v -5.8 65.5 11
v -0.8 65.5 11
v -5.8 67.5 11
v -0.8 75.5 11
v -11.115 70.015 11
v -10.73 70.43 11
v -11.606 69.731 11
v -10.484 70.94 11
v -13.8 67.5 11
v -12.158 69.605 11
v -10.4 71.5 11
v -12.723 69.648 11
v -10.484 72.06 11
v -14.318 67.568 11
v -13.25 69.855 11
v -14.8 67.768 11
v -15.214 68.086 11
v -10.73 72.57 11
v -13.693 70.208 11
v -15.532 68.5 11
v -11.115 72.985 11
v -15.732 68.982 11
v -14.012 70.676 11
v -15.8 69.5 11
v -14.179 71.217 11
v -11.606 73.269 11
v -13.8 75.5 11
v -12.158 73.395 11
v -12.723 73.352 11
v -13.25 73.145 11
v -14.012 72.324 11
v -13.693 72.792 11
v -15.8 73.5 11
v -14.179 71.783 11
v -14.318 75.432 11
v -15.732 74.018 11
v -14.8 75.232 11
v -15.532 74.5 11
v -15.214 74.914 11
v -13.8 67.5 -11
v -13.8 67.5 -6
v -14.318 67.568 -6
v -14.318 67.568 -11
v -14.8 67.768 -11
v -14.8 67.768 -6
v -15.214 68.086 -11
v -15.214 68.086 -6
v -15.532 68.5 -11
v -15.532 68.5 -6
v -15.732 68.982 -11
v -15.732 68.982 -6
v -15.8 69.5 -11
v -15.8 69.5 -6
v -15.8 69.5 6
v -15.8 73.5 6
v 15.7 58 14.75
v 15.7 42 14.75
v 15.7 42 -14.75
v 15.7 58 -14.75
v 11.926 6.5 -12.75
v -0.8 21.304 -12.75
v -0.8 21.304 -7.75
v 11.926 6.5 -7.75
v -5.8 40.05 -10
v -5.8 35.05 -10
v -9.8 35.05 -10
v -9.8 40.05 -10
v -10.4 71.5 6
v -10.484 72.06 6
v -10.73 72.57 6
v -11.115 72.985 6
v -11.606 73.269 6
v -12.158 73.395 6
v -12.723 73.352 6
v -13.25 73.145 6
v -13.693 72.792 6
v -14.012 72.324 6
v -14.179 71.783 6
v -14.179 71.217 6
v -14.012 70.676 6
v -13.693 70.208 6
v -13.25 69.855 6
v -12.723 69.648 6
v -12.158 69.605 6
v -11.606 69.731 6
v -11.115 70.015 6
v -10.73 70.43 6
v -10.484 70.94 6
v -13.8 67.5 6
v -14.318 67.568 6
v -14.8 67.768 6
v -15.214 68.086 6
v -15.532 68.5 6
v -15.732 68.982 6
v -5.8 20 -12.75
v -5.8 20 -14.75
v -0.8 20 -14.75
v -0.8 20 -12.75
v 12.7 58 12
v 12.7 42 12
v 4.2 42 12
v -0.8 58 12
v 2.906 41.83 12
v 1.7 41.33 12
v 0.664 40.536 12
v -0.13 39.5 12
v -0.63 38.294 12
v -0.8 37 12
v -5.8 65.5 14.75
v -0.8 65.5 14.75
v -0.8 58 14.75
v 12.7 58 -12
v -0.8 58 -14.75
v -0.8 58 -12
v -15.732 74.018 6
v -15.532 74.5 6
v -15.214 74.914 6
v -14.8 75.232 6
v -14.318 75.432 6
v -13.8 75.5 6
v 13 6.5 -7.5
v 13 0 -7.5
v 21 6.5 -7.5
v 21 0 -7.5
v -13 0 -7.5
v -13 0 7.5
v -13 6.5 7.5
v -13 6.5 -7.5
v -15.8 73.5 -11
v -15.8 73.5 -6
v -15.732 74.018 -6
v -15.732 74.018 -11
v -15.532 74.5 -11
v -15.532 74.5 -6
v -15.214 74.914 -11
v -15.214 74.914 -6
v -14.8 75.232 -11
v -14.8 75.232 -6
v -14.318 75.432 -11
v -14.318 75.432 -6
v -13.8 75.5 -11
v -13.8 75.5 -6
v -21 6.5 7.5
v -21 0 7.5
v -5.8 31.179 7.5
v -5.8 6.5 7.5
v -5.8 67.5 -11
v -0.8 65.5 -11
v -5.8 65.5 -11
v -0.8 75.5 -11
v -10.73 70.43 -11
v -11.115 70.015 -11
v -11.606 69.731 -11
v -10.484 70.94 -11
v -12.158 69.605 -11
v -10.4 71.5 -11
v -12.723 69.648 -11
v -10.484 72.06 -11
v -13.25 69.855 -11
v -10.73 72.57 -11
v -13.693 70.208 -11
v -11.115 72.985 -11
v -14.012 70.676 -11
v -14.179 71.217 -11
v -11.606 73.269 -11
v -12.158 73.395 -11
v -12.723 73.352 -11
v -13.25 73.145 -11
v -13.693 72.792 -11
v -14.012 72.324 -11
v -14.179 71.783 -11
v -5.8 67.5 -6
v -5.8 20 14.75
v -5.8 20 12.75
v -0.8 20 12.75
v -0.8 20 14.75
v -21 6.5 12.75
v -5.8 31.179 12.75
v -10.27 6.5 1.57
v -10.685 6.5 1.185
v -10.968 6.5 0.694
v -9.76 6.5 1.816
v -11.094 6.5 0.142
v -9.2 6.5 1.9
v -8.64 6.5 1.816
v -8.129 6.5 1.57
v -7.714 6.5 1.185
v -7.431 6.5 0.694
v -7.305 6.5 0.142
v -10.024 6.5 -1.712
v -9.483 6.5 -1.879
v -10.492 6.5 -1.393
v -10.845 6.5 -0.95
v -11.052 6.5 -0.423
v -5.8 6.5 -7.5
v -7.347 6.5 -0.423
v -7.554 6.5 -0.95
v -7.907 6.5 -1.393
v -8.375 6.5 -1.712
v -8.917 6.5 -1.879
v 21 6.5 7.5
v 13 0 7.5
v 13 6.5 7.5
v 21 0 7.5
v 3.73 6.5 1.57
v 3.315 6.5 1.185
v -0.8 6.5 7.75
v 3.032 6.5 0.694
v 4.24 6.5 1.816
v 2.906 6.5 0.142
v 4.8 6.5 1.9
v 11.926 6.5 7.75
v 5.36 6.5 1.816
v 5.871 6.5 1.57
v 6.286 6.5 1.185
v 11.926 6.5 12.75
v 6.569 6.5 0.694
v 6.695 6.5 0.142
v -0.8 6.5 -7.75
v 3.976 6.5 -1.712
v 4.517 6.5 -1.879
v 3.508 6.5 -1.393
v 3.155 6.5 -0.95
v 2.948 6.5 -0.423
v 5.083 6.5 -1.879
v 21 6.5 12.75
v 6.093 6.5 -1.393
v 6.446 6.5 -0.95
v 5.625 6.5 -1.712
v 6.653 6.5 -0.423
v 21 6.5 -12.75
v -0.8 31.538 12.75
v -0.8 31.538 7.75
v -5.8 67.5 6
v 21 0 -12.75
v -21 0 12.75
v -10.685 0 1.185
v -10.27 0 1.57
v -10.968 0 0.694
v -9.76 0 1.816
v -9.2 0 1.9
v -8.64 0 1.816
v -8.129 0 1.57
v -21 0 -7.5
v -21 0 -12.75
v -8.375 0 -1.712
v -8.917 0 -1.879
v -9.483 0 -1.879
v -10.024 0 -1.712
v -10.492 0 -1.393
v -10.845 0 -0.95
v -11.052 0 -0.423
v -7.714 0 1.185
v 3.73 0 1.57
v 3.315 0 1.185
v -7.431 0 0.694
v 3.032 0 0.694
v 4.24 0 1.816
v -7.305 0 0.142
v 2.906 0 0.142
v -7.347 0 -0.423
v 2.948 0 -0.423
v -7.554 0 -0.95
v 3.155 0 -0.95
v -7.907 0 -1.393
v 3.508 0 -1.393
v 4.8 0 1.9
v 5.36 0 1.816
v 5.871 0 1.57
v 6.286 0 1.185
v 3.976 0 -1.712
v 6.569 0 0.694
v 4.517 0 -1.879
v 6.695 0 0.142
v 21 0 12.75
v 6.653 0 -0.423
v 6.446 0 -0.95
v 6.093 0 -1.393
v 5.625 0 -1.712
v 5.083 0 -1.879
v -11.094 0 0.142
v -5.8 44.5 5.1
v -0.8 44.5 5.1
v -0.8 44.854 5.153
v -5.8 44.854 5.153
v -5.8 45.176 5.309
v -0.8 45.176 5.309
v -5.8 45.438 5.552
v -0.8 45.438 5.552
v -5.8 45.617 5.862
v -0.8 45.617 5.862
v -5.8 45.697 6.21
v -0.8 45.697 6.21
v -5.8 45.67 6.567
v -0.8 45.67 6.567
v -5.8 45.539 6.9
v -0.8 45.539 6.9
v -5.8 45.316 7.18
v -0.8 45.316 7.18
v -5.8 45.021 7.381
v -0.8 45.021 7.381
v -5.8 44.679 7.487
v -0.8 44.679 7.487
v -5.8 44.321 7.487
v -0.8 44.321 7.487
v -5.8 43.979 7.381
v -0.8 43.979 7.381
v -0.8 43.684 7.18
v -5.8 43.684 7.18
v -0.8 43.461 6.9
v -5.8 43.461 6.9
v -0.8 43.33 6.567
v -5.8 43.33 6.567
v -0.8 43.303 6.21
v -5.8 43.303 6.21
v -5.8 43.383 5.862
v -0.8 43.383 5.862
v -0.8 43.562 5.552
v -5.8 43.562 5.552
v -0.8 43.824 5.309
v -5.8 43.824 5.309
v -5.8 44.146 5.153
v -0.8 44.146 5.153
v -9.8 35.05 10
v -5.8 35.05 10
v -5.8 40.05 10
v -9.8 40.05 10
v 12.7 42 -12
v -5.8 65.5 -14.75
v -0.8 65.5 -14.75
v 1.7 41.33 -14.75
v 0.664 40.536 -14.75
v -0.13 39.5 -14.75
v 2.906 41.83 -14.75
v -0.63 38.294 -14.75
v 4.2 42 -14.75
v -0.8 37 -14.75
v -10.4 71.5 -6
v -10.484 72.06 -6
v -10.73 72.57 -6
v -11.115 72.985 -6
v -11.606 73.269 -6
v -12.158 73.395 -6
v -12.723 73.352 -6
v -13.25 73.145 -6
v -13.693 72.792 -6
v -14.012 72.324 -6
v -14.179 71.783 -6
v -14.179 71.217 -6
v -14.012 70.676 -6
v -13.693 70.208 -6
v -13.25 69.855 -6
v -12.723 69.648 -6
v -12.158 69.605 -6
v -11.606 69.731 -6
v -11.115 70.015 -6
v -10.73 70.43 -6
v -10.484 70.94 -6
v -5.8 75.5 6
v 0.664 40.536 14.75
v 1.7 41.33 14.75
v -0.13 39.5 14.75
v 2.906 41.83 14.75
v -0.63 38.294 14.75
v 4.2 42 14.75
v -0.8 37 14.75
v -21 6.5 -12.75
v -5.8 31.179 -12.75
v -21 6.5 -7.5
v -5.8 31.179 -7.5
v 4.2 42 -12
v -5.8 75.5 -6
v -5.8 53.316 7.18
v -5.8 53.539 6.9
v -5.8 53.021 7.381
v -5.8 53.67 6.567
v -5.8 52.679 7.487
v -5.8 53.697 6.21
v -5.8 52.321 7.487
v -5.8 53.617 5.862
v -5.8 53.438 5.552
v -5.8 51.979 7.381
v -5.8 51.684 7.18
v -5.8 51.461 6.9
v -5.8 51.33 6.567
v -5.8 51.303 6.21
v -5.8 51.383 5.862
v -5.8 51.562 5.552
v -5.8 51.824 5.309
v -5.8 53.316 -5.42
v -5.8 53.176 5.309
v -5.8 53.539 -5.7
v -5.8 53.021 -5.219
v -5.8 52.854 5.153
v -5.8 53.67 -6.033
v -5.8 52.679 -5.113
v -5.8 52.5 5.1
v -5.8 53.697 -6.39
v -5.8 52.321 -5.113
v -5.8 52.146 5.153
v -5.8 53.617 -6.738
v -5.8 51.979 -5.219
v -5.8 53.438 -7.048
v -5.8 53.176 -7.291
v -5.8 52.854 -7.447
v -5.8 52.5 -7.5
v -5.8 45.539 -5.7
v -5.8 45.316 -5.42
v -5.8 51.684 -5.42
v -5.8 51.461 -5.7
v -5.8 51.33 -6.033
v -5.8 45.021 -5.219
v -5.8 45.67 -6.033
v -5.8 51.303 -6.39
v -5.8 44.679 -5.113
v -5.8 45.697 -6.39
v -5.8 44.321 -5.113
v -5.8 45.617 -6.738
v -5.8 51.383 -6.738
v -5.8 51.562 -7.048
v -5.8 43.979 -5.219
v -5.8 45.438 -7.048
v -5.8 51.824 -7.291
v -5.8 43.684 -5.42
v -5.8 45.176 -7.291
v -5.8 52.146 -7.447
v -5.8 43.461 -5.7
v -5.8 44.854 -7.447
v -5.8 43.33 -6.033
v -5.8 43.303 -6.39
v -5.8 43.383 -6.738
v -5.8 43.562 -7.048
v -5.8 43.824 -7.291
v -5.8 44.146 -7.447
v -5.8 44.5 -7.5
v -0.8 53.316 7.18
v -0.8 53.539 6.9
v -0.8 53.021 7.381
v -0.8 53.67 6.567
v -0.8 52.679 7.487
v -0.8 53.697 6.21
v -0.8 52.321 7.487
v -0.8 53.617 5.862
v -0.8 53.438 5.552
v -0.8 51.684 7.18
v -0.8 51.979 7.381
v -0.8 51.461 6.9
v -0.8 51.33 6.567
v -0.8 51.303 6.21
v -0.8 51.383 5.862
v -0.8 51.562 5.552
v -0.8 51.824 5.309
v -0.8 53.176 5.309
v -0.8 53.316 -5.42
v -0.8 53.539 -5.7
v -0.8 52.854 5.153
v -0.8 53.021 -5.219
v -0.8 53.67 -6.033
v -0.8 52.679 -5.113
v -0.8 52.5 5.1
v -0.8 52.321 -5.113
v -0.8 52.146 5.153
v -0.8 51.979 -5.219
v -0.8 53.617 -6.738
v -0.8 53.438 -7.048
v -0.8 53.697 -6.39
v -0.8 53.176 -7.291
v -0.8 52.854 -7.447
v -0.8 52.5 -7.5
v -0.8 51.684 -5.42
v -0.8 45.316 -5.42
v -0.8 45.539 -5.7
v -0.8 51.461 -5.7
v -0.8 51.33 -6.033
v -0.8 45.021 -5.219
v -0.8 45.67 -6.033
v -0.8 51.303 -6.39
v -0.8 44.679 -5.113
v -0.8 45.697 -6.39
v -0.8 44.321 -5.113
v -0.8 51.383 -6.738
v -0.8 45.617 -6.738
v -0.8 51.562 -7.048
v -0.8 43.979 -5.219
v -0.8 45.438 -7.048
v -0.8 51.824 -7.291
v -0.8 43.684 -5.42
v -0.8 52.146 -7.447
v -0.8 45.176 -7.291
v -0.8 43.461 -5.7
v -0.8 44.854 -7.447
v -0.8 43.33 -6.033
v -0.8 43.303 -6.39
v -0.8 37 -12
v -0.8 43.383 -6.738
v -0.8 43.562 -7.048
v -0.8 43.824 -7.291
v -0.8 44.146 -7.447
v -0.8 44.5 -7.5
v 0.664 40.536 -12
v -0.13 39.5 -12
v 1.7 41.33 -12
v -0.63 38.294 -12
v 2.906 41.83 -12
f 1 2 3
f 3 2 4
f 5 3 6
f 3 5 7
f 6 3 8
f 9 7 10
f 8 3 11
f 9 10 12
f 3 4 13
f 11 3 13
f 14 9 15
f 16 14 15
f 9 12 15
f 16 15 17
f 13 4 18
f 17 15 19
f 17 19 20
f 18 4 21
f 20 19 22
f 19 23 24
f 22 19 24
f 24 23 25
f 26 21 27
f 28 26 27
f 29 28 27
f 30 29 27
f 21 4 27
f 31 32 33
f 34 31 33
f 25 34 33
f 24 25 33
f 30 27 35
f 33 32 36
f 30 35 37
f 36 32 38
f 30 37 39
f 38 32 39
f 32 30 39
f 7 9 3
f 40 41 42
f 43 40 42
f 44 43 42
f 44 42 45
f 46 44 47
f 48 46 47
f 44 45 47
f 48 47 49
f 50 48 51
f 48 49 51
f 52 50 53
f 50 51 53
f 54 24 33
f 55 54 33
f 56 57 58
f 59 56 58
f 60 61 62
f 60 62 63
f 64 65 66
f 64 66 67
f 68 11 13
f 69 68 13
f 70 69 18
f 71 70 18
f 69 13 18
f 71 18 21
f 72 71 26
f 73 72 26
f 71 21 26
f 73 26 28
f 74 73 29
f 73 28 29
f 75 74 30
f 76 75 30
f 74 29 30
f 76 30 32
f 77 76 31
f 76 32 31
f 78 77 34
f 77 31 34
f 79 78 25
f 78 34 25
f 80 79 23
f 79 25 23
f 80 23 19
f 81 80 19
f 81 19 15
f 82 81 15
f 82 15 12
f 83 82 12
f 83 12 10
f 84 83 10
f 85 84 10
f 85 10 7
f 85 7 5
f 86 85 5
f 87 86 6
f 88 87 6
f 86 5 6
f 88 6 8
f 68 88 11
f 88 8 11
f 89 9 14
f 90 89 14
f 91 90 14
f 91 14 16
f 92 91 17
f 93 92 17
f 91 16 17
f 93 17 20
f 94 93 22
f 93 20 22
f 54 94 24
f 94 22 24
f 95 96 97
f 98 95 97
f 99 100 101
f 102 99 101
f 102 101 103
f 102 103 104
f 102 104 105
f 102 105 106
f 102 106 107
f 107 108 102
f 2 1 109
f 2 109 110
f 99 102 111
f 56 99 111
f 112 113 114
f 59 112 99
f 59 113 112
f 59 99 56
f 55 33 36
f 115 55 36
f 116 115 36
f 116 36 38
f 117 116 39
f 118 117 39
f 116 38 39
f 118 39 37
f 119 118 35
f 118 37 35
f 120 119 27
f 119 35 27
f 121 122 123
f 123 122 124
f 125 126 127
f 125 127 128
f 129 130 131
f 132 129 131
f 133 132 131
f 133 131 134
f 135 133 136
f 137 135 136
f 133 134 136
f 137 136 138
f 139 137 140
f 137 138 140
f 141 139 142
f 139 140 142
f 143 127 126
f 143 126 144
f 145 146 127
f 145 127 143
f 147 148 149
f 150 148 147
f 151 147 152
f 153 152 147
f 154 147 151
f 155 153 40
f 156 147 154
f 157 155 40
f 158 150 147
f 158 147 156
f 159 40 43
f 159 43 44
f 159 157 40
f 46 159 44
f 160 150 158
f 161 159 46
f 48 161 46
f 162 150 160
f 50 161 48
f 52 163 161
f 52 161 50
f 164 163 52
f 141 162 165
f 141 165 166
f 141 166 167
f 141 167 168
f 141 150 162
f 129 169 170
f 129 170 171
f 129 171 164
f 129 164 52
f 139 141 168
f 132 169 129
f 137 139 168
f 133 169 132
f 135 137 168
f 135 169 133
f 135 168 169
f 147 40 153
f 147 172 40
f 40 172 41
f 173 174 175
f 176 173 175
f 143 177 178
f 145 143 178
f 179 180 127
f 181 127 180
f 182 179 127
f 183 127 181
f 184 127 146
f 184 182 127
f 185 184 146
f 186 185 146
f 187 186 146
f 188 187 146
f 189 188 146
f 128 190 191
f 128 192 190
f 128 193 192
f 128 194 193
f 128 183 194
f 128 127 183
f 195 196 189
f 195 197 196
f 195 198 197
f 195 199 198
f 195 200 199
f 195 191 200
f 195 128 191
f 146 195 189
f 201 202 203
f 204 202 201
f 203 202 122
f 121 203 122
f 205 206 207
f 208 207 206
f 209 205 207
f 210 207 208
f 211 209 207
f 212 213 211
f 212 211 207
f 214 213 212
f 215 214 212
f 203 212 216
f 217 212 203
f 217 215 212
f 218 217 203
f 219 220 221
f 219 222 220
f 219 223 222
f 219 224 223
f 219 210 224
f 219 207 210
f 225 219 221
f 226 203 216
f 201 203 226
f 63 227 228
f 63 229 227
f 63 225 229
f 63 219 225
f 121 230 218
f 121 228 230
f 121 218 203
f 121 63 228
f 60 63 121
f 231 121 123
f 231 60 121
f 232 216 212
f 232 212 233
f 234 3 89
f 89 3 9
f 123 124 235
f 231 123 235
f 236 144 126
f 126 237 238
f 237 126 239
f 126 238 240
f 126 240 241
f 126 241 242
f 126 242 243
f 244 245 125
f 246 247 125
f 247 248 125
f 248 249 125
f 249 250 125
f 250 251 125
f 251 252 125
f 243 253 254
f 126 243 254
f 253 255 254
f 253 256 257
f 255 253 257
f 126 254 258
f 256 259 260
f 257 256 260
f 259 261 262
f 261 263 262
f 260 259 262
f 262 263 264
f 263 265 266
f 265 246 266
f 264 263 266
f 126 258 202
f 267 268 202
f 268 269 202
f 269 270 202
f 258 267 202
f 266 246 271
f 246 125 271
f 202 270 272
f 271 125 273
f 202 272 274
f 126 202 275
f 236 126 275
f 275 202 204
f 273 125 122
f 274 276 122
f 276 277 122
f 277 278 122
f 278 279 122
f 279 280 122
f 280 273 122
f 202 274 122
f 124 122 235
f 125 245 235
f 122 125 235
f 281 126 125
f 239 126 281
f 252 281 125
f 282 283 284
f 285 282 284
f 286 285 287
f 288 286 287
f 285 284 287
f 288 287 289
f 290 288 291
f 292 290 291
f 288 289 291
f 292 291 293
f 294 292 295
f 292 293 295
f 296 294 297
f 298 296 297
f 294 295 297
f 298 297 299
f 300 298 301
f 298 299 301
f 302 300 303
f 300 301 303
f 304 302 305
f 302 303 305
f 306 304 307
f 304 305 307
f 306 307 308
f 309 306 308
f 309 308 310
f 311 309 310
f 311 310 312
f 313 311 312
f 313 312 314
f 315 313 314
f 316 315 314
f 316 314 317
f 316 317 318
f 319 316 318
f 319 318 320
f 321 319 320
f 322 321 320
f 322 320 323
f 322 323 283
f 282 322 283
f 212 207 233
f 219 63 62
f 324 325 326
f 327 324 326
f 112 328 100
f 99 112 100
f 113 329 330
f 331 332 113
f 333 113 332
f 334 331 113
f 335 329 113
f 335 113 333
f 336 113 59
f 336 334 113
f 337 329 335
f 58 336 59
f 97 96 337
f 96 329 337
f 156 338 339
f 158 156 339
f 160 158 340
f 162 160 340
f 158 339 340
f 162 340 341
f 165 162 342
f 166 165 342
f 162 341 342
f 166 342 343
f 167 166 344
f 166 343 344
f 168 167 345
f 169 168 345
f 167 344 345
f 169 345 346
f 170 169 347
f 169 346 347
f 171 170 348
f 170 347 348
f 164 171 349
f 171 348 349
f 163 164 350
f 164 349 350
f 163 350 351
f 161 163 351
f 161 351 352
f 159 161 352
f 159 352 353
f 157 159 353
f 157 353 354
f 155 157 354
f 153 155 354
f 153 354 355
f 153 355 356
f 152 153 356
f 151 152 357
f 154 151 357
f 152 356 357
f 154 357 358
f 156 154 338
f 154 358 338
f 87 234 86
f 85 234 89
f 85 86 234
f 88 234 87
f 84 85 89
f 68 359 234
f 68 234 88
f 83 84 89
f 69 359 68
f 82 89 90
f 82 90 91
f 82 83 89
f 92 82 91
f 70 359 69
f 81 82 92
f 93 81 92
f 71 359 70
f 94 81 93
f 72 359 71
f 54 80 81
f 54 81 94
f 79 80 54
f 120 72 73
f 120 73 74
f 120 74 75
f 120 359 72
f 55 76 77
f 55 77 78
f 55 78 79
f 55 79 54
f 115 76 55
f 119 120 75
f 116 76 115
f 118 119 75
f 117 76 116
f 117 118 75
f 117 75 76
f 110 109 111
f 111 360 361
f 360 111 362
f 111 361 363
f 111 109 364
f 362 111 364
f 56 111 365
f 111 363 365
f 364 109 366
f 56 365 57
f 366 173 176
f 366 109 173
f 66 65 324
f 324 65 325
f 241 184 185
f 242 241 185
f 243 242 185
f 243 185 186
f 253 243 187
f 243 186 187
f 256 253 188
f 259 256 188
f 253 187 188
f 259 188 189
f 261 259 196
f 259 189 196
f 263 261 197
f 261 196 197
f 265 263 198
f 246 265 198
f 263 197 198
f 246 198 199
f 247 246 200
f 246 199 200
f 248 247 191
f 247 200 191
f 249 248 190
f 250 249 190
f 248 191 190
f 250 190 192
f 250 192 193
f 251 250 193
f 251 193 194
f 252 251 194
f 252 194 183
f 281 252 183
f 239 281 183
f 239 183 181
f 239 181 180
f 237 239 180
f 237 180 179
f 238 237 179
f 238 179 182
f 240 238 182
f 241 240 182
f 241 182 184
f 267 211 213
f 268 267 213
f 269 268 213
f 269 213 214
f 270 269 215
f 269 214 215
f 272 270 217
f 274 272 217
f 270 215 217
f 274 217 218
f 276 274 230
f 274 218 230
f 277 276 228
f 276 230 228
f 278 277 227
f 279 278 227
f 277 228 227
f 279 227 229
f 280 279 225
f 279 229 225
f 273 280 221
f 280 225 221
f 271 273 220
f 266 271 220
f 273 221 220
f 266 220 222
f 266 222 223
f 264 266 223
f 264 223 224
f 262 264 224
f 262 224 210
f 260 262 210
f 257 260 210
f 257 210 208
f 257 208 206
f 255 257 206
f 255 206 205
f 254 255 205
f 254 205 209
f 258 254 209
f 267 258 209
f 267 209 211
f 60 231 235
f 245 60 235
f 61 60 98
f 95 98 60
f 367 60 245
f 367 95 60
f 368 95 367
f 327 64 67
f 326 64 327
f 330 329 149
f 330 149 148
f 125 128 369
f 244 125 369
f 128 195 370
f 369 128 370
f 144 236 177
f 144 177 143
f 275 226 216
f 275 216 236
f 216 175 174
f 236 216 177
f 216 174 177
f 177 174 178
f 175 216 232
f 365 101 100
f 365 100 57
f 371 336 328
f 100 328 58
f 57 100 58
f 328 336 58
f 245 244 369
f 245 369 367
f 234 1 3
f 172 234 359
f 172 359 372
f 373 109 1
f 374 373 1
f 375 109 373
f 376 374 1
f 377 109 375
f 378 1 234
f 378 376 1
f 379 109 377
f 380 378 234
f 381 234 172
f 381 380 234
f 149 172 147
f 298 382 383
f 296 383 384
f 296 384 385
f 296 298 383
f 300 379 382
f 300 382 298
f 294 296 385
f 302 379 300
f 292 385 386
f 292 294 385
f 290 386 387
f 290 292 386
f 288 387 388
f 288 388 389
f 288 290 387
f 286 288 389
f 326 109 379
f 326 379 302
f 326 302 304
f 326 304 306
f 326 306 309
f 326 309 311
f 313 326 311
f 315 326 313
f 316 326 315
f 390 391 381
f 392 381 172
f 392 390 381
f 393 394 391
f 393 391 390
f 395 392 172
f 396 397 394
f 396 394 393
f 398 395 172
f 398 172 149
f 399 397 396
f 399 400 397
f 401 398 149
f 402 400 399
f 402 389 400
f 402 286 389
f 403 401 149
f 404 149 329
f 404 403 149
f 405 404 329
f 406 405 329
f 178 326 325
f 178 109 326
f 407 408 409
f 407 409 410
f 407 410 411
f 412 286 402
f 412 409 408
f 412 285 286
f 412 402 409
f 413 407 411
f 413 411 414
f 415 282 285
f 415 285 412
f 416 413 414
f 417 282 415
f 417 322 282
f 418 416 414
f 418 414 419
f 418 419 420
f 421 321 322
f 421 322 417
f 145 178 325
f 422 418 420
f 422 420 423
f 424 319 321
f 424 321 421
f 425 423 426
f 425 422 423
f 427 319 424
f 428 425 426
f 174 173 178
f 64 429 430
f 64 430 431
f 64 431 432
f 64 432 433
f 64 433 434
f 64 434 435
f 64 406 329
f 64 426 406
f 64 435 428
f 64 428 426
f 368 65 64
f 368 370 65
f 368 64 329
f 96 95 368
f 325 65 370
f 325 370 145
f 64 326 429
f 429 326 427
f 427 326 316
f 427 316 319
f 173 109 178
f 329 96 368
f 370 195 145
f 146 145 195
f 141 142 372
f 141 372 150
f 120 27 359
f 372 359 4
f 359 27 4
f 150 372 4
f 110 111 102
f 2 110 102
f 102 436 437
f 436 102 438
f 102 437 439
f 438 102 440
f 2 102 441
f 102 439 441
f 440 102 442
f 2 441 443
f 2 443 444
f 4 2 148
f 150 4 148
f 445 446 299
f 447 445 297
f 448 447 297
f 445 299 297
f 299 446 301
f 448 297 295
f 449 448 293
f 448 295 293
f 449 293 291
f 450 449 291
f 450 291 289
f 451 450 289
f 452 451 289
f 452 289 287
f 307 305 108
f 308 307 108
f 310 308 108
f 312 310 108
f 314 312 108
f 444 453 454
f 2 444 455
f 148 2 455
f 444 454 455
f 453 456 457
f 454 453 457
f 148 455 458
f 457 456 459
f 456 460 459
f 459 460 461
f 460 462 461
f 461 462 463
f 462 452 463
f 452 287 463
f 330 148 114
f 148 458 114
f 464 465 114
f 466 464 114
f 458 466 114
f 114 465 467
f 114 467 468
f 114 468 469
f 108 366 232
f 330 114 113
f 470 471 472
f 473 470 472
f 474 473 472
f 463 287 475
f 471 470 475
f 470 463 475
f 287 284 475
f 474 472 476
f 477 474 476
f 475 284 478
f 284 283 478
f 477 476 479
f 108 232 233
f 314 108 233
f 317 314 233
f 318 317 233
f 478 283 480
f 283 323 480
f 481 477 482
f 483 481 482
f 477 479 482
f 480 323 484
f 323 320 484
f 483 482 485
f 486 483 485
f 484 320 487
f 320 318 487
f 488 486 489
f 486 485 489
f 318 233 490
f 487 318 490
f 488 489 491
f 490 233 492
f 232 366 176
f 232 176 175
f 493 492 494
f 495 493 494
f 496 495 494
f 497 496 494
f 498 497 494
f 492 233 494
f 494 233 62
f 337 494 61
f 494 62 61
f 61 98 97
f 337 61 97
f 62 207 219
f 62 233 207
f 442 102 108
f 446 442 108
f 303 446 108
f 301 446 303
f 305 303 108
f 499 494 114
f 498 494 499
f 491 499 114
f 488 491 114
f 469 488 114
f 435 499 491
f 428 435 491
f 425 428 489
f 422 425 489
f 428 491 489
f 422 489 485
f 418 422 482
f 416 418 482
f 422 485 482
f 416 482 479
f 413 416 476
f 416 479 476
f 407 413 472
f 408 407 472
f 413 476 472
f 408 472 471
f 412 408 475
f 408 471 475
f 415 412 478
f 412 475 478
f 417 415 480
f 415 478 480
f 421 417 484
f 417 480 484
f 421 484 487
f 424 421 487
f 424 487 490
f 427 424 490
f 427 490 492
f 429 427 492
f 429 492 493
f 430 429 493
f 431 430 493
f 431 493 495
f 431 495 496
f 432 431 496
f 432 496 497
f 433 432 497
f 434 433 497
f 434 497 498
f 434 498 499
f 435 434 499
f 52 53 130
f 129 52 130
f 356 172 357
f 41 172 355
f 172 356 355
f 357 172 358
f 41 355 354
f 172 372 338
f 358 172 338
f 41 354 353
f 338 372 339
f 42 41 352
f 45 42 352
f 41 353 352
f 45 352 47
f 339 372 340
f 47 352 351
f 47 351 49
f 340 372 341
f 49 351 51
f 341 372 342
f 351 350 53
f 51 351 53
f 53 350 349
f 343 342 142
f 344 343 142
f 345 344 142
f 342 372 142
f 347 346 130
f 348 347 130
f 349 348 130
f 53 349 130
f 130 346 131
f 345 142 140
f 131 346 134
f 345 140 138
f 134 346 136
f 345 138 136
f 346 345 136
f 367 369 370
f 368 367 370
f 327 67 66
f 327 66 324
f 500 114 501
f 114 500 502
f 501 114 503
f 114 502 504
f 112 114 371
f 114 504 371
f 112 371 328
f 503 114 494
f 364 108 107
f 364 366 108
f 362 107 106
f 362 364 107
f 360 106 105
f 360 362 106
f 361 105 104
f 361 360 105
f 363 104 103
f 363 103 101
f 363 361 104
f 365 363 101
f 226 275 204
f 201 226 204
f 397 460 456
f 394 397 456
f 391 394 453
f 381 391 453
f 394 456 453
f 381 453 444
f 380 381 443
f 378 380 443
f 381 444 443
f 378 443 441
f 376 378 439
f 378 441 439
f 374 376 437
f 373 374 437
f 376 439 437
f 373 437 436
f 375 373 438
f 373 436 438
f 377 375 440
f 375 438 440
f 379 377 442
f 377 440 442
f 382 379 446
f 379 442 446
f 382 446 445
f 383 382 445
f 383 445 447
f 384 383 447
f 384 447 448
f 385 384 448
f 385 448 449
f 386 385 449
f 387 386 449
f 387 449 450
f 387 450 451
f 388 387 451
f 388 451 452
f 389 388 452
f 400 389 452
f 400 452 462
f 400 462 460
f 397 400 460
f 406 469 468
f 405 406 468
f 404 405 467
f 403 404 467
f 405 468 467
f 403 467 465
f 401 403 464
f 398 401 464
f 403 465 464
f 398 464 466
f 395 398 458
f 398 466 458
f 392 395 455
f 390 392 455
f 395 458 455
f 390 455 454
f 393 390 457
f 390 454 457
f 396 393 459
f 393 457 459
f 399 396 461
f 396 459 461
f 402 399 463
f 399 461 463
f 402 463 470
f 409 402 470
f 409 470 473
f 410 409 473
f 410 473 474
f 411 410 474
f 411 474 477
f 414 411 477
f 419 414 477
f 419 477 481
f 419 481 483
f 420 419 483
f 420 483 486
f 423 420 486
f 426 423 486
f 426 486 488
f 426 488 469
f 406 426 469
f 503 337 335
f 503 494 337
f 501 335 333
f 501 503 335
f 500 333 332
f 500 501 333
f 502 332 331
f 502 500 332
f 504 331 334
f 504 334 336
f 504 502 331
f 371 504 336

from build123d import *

# Parameters (mm, degrees)
ESQUISSE1_W                = 42
ESQUISSE1_H                = 25.5
BOSS_EXTRU_1_DEPTH         = 6.5
ESQUISSE2_W                = 16
ESQUISSE2_H                = 15
ENL_V_MAT_EXTRU_1_DEPTH    = 10
ESQUISSE3_W                = 5
ESQUISSE3_H                = 25.5
BOSS_EXTRU_2_DEPTH         = 13.5
ESQUISSE6_W                = 5
ESQUISSE6_H                = 29.5
BOSS_EXTRU_3_DEPTH         = 45.5
ESQUISSE4_R                = 1.2
ENL_V_MAT_EXTRU_3_DEPTH    = 45.5
BOSS_EXTRU_4_START         = 22
BOSS_EXTRU_4_DEPTH         = 16
CONG_2_R                   = 5
BOSS_EXTRU_5_DEPTH         = 5
ESQUISSE10_R               = 1.9
ENL_V_MAT_EXTRU_5_DEPTH    = 17
ESQUISSE11_W               = 20
ESQUISSE11_H               = 5
BOSS_EXTRU_6_DEPTH         = 4
BOSS_EXTRU_7_DEPTH         = 5
BOSS_EXTRU_8_DEPTH         = 5.25
R_P_TITION_LIN_AIRE1_COUNT = 2
R_P_TITION_LIN_AIRE1_PITCH = 20.25
ESQUISSE15_W               = 5
ESQUISSE15_H               = 22
BOSS_EXTRU_9_DEPTH         = 10
ESQUISSE16_R               = 1.9
BOSS_EXTRU_10_DEPTH        = 5
R_P_TITION_LIN_AIRE2_COUNT = 2
R_P_TITION_LIN_AIRE2_PITCH = 17


with BuildPart() as part:
    # Esquisse1 → Boss.-Extru.1 (new body)
    with BuildSketch(Plane(origin=(0, 0, 0), x_dir=(1, 0, 0), z_dir=(0, 1, 0))):
        Rectangle(ESQUISSE1_W, ESQUISSE1_H)
    extrude(amount=BOSS_EXTRU_1_DEPTH)

    # Esquisse2 → Enlèv. mat.-Extru.1 (cut)
    with BuildSketch(Plane(origin=(0, 0, 0), x_dir=(1, 0, 0), z_dir=(0, 1, 0))):
        with Locations((-21, 0)):
            Rectangle(ESQUISSE2_W, ESQUISSE2_H)
        with Locations((21, 0)):
            Rectangle(ESQUISSE2_W, ESQUISSE2_H)
    extrude(amount=ENL_V_MAT_EXTRU_1_DEPTH, mode=Mode.SUBTRACT)

    # Esquisse3 → Boss.-Extru.2 (add)
    with BuildSketch(Plane(origin=(0, 6.5, 0), x_dir=(1, 0, 0), z_dir=(0, 1, 0))):
        with Locations((-3.3, 0)):
            Rectangle(ESQUISSE3_W, ESQUISSE3_H)
    extrude(amount=BOSS_EXTRU_2_DEPTH)

    # Esquisse6 → Boss.-Extru.3 (add)
    with BuildSketch(Plane(origin=(0, 20, 0), x_dir=(1, 0, 0), z_dir=(0, 1, 0))):
        with Locations((-3.3, 0)):
            Rectangle(ESQUISSE6_W, ESQUISSE6_H)
    extrude(amount=BOSS_EXTRU_3_DEPTH)

    # Esquisse4 → Enlèv. mat.-Extru.3 (cut)
    with BuildSketch(Plane(origin=(-0.8, 0, 0), x_dir=(0, 0, -1), z_dir=(1, 0, 0))):
        with Locations((-6.3, 52.5)):
            Circle(ESQUISSE4_R)
        with Locations((6.3, 52.5)):
            Circle(ESQUISSE4_R)
        with Locations((6.3, 44.5)):
            Circle(ESQUISSE4_R)
        with Locations((-6.3, 44.5)):
            Circle(ESQUISSE4_R)
    extrude(amount=-ENL_V_MAT_EXTRU_3_DEPTH, mode=Mode.SUBTRACT)

    # Esquisse5 → Boss.-Extru.4 (add)
    with BuildSketch(Plane(origin=(0, 20, 0), x_dir=(1, 0, 0), z_dir=(0, 1, 0)).offset(BOSS_EXTRU_4_START)):
        Polygon((-0.8, 14.75), (-0.8, 12), (12.7, 12), (12.7, -12), (-0.8, -12), (-0.8, -14.75), (15.7, -14.75), (15.7, 14.75), align=None)
    extrude(amount=BOSS_EXTRU_4_DEPTH)

    # Congé2
    cong_2_edges = [part.edges().sort_by_distance(p)[0] for p in [
        (-0.8, 42, 13.375),
        (-0.8, 42, -13.375),
    ]]
    fillet(cong_2_edges, radius=CONG_2_R)

    # Esquisse9 → Boss.-Extru.5 (add)
    with BuildSketch(Plane.XY.offset(12.75)):
        Polygon((-0.8, 22.034425492), (-0.8, 6.5), (11.926120582, 6.5), (-0.8, 31.53809605), align=None)
    extrude(amount=-BOSS_EXTRU_5_DEPTH)

    # Esquisse10 → Enlèv. mat.-Extru.5 (cut)
    with BuildSketch(Plane(origin=(0, 6.5, 0), x_dir=(1, 0, 0), z_dir=(0, 1, 0))):
        with Locations(Location((-9.199739461, 0, 0), (0, 0, 270))):
            Circle(ESQUISSE10_R)
        with Locations(Location((4.800260539, 0, 0), (0, 0, 270))):
            Circle(ESQUISSE10_R)
    extrude(amount=-ENL_V_MAT_EXTRU_5_DEPTH, mode=Mode.SUBTRACT)

    # Esquisse11 → Boss.-Extru.6 (add)
    with BuildSketch(Plane.ZY.offset(5.8)):
        with Locations((0, 37.55)):
            Rectangle(ESQUISSE11_W, ESQUISSE11_H)
    extrude(amount=BOSS_EXTRU_6_DEPTH)

    # Esquisse12 → Boss.-Extru.7 (add)
    with BuildSketch(Plane(origin=(0, 0, -12.75), x_dir=(-1, 0, 0), z_dir=(0, 0, -1))):
        Polygon((0.8, 21.304240475), (-11.926120582, 6.5), (0.8, 6.5), align=None)
    extrude(amount=-BOSS_EXTRU_7_DEPTH)

    # Esquisse13 → Boss.-Extru.8 (add)
    with BuildSketch(Plane.XY.offset(12.75)):
        Polygon((-21, 6.5), (-5.8, 31.179013399), (-5.8, 6.5), align=None)
    boss_extru_8 = extrude(amount=-BOSS_EXTRU_8_DEPTH)

    # Répétition linéaire1: Boss.-Extru.8 ×2
    with Locations(*[(0, 0, -i * R_P_TITION_LIN_AIRE1_PITCH) for i in range(1, R_P_TITION_LIN_AIRE1_COUNT)]):
        add(boss_extru_8)

    # Esquisse15 → Boss.-Extru.9 (add)
    with BuildSketch(Plane(origin=(0, 65.5, 0), x_dir=(1, 0, 0), z_dir=(0, 1, 0))):
        with Locations((-3.3, 0)):
            Rectangle(ESQUISSE15_W, ESQUISSE15_H)
    extrude(amount=BOSS_EXTRU_9_DEPTH)

    # Esquisse16 → Boss.-Extru.10 (add)
    with BuildSketch(Plane.XY.offset(11)):
        with BuildLine():
            Line((-5.8, 75.5), (-5.8, 67.5))
            Line((-5.8, 67.5), (-13.8, 67.5))
            ThreePointArc((-13.8, 67.5), (-15.214213562, 68.085786438), (-15.8, 69.5))
            Line((-15.8, 69.5), (-15.8, 73.5))
            ThreePointArc((-15.8, 73.5), (-15.214213562, 74.914213562), (-13.8, 75.5))
            Line((-13.8, 75.5), (-5.8, 75.5))
        make_face()
        with Locations((-12.3, 71.5)):
            Circle(ESQUISSE16_R, mode=Mode.SUBTRACT)
    boss_extru_10 = extrude(amount=-BOSS_EXTRU_10_DEPTH)

    # Répétition linéaire2: Boss.-Extru.10 ×2
    with Locations(*[(0, 0, -i * R_P_TITION_LIN_AIRE2_PITCH) for i in range(1, R_P_TITION_LIN_AIRE2_COUNT)]):
        add(boss_extru_10)


solid = part.part
